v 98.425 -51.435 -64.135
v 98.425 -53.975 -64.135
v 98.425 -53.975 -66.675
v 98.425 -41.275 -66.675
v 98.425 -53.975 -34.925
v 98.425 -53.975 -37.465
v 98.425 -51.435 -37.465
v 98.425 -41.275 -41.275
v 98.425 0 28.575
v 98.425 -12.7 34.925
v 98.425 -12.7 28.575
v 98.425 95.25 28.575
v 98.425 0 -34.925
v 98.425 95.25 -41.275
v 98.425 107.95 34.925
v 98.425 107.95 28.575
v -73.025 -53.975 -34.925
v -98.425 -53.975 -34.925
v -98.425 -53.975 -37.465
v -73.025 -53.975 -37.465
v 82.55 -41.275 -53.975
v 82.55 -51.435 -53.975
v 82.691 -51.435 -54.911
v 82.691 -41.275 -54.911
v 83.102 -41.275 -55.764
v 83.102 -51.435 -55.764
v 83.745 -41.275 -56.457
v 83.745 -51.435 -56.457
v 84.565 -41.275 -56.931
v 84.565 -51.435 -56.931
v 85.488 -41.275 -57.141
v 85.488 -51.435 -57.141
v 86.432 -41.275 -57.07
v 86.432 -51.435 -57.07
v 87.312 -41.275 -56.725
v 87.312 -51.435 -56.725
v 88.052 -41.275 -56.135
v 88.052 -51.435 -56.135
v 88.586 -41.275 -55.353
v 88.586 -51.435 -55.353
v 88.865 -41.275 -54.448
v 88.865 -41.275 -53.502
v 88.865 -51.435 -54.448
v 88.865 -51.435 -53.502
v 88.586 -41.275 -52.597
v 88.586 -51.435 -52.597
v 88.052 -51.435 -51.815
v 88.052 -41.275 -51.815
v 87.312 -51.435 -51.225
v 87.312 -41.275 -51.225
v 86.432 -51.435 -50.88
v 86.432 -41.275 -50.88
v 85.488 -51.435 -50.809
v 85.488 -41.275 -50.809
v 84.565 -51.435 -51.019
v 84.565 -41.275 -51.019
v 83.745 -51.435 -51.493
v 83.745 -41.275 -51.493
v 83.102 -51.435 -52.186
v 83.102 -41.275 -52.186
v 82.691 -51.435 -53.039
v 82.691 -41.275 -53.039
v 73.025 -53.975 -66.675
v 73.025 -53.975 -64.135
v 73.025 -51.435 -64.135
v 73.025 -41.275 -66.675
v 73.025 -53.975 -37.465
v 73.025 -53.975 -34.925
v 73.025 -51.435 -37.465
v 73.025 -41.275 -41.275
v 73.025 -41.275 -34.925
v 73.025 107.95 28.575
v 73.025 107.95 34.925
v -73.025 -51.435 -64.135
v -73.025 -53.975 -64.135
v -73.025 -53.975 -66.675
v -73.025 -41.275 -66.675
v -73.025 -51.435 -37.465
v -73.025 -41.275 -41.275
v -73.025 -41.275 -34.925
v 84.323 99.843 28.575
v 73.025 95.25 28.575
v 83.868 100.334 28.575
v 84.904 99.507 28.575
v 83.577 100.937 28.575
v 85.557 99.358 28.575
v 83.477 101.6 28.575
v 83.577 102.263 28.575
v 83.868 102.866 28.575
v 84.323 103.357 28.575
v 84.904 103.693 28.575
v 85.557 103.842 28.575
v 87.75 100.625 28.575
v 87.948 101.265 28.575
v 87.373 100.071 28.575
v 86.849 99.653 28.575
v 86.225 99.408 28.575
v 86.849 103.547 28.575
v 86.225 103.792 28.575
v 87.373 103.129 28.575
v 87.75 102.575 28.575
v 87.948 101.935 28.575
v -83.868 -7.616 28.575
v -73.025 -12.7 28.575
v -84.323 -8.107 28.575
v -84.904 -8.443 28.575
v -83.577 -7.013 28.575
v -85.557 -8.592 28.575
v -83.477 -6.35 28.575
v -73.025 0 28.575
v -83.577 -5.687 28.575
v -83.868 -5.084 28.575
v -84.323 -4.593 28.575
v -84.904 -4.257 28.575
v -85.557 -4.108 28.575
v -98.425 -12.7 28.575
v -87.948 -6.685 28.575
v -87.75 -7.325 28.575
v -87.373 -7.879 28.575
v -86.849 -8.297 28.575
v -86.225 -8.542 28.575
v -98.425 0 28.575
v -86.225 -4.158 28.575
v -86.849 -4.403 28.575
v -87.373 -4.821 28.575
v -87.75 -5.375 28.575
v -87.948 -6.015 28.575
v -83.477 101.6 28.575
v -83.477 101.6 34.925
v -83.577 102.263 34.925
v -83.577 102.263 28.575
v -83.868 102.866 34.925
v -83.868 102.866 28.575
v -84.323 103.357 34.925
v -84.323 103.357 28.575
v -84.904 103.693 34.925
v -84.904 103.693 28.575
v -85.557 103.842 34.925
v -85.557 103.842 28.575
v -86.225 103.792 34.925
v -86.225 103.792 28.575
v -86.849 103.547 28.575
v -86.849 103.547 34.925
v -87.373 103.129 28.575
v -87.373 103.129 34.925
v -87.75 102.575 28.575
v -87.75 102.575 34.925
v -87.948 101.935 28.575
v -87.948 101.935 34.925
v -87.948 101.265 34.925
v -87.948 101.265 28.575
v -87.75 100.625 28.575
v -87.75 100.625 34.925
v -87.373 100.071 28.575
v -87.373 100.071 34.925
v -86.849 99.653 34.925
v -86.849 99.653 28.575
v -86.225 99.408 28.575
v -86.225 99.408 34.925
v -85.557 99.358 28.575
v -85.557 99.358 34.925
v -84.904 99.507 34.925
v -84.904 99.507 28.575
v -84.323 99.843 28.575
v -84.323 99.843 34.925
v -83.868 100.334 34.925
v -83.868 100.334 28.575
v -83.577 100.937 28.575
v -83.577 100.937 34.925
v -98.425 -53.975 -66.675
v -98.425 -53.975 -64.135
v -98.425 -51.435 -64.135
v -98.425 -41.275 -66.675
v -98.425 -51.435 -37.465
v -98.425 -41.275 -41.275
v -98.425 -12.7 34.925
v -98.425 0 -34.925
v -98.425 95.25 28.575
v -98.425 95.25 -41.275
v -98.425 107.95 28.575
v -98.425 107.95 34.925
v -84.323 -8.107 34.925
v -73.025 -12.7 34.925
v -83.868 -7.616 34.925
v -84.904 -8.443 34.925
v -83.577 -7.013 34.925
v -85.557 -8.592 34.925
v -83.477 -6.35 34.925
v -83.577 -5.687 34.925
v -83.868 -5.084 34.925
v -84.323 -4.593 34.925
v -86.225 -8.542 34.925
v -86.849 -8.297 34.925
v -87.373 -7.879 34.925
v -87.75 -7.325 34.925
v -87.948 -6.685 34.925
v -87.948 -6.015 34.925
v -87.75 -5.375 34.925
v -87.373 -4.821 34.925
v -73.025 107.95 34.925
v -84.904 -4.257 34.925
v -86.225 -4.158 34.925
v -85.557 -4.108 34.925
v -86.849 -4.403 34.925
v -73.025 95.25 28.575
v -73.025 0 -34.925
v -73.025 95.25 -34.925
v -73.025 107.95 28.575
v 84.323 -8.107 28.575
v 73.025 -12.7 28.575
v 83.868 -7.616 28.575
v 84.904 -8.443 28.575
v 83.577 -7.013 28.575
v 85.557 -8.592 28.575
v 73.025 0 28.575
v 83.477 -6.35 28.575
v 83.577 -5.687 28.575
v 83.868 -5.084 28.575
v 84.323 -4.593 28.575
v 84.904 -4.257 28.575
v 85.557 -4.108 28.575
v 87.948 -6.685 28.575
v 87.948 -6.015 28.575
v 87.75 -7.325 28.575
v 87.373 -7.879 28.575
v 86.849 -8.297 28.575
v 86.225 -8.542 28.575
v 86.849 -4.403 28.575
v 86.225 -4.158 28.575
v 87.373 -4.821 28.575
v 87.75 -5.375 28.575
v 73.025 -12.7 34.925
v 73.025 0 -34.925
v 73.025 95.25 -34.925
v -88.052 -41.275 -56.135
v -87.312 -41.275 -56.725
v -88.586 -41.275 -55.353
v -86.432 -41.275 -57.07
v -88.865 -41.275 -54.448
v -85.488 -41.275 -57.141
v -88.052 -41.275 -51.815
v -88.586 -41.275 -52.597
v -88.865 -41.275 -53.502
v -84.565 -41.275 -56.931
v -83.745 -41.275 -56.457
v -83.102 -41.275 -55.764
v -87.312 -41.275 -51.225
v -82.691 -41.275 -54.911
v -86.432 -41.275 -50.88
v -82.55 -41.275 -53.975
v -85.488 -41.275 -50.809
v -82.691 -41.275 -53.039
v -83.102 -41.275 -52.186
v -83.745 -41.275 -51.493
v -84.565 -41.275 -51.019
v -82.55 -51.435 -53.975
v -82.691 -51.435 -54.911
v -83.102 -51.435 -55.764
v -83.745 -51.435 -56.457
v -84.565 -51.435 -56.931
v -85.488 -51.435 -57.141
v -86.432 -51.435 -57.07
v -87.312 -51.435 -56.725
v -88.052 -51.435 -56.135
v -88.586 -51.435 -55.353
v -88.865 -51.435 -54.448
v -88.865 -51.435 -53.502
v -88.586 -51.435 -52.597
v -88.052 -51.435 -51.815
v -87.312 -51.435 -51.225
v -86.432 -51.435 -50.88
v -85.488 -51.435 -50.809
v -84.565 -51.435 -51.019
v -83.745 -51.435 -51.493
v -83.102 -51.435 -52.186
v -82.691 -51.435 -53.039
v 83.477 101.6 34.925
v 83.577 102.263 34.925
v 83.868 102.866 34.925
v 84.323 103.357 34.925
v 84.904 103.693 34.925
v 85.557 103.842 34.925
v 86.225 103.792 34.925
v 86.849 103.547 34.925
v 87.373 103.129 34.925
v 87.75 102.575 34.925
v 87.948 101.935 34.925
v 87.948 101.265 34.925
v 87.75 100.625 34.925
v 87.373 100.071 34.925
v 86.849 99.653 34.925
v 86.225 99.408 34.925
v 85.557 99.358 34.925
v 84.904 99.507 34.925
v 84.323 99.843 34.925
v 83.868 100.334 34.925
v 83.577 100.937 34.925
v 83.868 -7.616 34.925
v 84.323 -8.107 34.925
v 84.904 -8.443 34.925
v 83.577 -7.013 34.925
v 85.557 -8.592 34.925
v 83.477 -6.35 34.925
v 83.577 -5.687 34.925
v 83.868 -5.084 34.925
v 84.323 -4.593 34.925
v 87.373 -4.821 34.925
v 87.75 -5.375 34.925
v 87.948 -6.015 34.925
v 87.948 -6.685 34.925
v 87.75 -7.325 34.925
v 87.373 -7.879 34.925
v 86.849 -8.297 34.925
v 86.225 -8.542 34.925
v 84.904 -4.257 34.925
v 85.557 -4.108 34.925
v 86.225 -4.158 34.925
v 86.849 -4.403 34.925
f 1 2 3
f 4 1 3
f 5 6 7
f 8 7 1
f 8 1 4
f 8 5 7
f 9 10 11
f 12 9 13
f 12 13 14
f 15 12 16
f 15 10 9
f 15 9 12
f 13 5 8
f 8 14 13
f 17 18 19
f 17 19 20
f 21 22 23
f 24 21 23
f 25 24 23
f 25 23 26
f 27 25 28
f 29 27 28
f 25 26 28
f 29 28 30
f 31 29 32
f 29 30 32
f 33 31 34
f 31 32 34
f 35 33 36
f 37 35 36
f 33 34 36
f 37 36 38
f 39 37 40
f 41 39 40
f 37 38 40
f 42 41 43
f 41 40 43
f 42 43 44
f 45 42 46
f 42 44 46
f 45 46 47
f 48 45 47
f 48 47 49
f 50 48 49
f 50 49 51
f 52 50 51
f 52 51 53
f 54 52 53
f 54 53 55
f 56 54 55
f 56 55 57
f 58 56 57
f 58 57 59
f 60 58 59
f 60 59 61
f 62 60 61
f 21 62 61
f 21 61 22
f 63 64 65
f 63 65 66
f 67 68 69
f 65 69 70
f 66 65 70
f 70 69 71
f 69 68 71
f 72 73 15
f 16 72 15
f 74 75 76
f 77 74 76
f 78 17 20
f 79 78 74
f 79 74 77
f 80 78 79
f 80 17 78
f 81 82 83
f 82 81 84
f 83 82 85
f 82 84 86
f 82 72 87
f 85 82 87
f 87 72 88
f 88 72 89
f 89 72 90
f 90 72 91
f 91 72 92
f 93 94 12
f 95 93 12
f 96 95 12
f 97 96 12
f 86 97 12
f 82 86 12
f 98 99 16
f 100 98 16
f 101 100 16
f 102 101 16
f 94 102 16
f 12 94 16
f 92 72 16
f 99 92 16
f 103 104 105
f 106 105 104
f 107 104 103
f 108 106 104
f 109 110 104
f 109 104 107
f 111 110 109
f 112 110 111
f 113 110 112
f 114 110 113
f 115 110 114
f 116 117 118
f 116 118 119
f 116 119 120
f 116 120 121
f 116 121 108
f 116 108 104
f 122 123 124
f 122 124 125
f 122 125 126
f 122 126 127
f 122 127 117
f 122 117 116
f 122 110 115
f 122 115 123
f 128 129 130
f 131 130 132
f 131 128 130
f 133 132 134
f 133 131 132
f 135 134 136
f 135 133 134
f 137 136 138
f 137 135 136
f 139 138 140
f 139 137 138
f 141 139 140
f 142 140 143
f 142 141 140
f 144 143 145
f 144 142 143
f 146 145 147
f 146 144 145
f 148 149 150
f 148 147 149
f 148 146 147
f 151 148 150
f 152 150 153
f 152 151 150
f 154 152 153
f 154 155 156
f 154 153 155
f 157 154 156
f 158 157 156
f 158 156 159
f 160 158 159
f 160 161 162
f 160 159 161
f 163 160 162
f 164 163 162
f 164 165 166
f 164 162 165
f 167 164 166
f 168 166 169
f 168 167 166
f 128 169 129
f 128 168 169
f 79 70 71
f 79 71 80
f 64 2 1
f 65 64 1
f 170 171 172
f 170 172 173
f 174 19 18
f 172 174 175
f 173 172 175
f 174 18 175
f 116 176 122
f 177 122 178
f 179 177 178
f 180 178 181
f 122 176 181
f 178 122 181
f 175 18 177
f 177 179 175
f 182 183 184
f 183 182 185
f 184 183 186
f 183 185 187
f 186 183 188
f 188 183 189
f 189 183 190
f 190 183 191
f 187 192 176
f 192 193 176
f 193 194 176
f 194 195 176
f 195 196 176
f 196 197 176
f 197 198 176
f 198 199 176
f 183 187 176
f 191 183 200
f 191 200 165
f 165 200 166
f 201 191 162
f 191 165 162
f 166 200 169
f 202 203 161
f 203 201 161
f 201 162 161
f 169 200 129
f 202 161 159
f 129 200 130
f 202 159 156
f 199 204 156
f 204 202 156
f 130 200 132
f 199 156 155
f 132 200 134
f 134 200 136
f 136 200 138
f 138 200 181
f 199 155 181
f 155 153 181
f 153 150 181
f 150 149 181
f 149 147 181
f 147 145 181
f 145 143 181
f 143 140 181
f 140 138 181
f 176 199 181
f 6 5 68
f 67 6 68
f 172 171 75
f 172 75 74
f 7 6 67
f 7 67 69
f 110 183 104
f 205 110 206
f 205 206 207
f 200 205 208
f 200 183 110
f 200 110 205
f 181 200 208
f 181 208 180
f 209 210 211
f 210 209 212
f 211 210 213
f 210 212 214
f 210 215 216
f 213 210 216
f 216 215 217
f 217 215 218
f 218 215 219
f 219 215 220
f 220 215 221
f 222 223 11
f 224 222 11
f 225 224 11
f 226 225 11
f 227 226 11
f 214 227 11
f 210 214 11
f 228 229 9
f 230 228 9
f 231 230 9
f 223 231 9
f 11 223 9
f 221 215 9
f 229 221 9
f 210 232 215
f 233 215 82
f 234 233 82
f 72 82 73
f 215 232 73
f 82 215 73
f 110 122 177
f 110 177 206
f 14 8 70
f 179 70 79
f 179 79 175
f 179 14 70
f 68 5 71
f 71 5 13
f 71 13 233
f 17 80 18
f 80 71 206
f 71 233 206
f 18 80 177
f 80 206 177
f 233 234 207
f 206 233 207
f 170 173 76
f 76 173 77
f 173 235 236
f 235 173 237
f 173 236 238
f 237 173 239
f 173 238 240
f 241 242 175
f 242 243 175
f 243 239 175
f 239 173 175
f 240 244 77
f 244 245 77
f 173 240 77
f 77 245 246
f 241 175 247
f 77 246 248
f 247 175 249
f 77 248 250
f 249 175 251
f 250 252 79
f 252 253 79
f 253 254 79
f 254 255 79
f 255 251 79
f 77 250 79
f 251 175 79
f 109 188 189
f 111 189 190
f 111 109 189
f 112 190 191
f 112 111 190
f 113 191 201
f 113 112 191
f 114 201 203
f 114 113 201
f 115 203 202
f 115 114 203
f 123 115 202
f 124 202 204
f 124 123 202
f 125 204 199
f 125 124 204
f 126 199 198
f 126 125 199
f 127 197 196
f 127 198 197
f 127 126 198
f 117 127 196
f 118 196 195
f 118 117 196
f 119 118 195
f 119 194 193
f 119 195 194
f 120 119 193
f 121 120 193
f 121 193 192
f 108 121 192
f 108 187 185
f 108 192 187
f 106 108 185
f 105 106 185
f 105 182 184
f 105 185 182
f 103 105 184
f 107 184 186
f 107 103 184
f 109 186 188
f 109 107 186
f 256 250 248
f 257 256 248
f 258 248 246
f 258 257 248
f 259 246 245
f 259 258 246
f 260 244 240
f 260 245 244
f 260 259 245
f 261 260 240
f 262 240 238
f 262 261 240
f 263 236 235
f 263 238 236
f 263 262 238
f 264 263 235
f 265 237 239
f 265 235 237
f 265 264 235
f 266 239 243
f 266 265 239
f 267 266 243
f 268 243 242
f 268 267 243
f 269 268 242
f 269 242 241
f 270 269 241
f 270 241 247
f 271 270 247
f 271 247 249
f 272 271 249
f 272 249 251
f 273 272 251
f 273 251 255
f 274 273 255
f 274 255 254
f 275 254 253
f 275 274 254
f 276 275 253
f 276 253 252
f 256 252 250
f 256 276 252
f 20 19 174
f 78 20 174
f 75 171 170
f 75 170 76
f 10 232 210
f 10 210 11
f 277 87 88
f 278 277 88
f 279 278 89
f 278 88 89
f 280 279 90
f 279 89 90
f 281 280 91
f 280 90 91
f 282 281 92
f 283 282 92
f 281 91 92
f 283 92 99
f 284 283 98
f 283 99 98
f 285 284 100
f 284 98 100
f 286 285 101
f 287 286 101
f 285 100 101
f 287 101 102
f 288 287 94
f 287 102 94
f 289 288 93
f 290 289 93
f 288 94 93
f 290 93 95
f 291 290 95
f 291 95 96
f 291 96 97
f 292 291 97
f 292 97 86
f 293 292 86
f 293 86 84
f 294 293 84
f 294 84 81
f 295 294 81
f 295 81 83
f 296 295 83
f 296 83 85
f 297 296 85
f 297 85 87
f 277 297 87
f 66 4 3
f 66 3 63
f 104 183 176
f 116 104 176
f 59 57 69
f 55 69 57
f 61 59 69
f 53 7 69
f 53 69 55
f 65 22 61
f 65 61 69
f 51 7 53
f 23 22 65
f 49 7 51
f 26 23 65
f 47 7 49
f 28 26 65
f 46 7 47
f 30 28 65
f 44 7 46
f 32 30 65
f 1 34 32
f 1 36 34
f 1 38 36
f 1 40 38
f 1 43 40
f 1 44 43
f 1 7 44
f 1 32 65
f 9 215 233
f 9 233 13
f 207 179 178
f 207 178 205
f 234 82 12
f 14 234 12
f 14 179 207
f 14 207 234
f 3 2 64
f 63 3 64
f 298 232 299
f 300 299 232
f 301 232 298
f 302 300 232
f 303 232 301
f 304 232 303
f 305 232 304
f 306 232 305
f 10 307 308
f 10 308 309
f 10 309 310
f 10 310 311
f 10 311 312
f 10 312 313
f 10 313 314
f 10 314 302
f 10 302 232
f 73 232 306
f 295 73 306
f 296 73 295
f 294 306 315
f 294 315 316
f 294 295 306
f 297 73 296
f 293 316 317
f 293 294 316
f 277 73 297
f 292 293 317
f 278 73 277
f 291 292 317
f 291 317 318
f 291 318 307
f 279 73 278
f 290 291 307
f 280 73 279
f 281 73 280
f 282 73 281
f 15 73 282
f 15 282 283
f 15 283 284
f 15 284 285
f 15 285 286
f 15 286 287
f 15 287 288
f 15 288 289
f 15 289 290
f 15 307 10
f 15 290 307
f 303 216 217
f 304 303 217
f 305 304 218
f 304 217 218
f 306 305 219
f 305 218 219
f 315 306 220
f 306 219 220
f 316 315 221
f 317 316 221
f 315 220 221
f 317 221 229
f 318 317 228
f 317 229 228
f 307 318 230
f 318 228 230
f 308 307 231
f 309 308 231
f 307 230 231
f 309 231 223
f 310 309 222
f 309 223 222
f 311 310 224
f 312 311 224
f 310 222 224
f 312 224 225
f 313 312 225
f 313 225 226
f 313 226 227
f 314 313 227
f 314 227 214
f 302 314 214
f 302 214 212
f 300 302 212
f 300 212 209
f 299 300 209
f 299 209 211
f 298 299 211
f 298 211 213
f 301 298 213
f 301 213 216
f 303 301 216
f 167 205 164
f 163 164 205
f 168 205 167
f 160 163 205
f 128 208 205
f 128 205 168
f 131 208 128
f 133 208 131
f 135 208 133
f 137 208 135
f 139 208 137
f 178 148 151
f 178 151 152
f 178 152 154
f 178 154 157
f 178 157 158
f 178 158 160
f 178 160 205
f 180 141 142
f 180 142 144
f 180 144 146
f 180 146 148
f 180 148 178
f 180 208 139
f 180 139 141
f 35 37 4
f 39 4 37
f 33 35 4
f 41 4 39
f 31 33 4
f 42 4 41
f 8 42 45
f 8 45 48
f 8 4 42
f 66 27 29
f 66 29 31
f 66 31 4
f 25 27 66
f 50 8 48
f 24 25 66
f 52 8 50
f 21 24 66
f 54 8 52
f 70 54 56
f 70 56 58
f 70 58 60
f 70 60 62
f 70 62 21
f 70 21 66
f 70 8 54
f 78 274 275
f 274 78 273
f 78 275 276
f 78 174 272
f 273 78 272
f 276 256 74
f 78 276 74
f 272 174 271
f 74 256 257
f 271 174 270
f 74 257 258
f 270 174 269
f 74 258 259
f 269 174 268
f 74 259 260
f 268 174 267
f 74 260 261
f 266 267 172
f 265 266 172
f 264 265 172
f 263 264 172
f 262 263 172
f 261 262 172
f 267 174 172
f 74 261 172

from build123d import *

# Parameters (mm, degrees)
SKETCH1_W                   = 196.85
SKETCH1_H                   = 82.55
BOSS_EXTRUDE1_DEPTH         = 95.25
SKETCH3_W                   = 146.05
SKETCH3_H                   = 76.2
CUT_EXTRUDE1_DEPTH          = 144.051280141
SKETCH4_W                   = 25.4
SKETCH4_H                   = 53.975
BOSS_EXTRUDE2_DEPTH         = 6.35
SKETCH5_W                   = 25.4
SKETCH5_H                   = 12.7
BOSS_EXTRUDE3_DEPTH         = 25.4
SKETCH6_W                   = 26.67
SKETCH6_H                   = 2.54
CUT_EXTRUDE2_DEPTH          = 229.622047548
F_1_4_0_25_DIAMETER_HOLE1_D = 6.35
SKETCH16_W                  = 196.85
SKETCH16_H                  = 6.35
CUT_EXTRUDE3_DEPTH          = 191.790819682
BOSS_EXTRUDE4_START         = -6.35
SKETCH11_W                  = 25.4
SKETCH11_H                  = 12.7
BOSS_EXTRUDE4_DEPTH         = 6.35
F_8_CLEARANCE_HOLE1_D       = 4.4958
F_8_CLEARANCE_HOLE1_DEPTH   = 12.7
SKETCH14_W                  = 146.05
SKETCH14_H                  = 41.275
BOSS_EXTRUDE5_DEPTH         = 6.35


with BuildPart() as part:
    # Sketch1 → Boss-Extrude1 (new body)
    with BuildSketch(Plane(origin=(0, 0, 0), x_dir=(1, 0, 0), z_dir=(0, 1, 0))):
        Rectangle(SKETCH1_W, SKETCH1_H)
    extrude(amount=BOSS_EXTRUDE1_DEPTH)

    # Sketch3 → Cut-Extrude1 (cut, through all)
    with BuildSketch(Plane(origin=(0, 95.25, 0), x_dir=(1, 0, 0), z_dir=(0, 1, 0))):
        with Locations((0, -3.175)):
            Rectangle(SKETCH3_W, SKETCH3_H)
    extrude(amount=-CUT_EXTRUDE1_DEPTH, mode=Mode.SUBTRACT)

    # Sketch4 → Boss-Extrude2 (add)
    with BuildSketch(Plane(origin=(0, 0, -41.275), x_dir=(-1, 0, 0), z_dir=(0, 0, -1))):
        with Locations((-85.725, -26.9875)):
            Rectangle(SKETCH4_W, SKETCH4_H)
    boss_extrude2 = extrude(amount=-BOSS_EXTRUDE2_DEPTH)

    # Sketch5 → Boss-Extrude3 (add)
    with BuildSketch(Plane(origin=(0, 0, -41.275), x_dir=(-1, 0, 0), z_dir=(0, 0, -1))):
        with Locations((-85.725, -47.625)):
            Rectangle(SKETCH5_W, SKETCH5_H)
    boss_extrude3 = extrude(amount=BOSS_EXTRUDE3_DEPTH)

    # Sketch6 → Cut-Extrude2 (cut, through all)
    with BuildSketch(Plane(origin=(98.425, 0, 0), x_dir=(0, 0, -1), z_dir=(1, 0, 0))):
        with Locations((50.8, -52.705)):
            Rectangle(SKETCH6_W, SKETCH6_H)
    cut_extrude2 = extrude(amount=-CUT_EXTRUDE2_DEPTH, mode=Mode.SUBTRACT)

    # 1/4 (0.25) Diameter Hole1 (through all)
    with Locations(Plane(origin=(0, -41.275, 0), x_dir=(1, 0, 0), z_dir=(0, 1, 0))):
        with Locations((85.725, 53.975)):
            f_1_4_0_25_diameter_hole1 = Hole(F_1_4_0_25_DIAMETER_HOLE1_D / 2)

    # Sketch16 → Cut-Extrude3 (cut, through all)
    with BuildSketch(Plane(origin=(0, 95.25, 0), x_dir=(1, 0, 0), z_dir=(0, 1, 0))):
        with Locations((0, -38.1)):
            Rectangle(SKETCH16_W, SKETCH16_H)
    extrude(amount=-CUT_EXTRUDE3_DEPTH, mode=Mode.SUBTRACT)

    # Sketch11 → Boss-Extrude4 (add)
    with BuildSketch(Plane.XY.offset(41.275).offset(BOSS_EXTRUDE4_START)):
        with Locations((85.725, 101.6)):
            Rectangle(SKETCH11_W, SKETCH11_H)
        with Locations((85.725, -6.35)):
            Rectangle(SKETCH11_W, SKETCH11_H)
    boss_extrude4 = extrude(amount=-BOSS_EXTRUDE4_DEPTH)

    # #8 Clearance Hole1
    with Locations(Plane.XY.offset(41.275)):
        with Locations((85.725, 101.6), (85.725, -6.35)):
            f_8_clearance_hole1 = Hole(F_8_CLEARANCE_HOLE1_D / 2, depth=F_8_CLEARANCE_HOLE1_DEPTH)

    # Mirror1: Boss-Extrude2, Boss-Extrude3, Cut-Extrude2, 1/4 (0.25) Diameter Hole1, Boss-Extrude4, #8 Clearance Hole1 across plane
    add(boss_extrude2.mirror(Plane(origin=(0, 0, 0), x_dir=(0, 0, 1), z_dir=(1, 0, 0))))
    add(boss_extrude3.mirror(Plane(origin=(0, 0, 0), x_dir=(0, 0, 1), z_dir=(1, 0, 0))))
    add(cut_extrude2.mirror(Plane(origin=(0, 0, 0), x_dir=(0, 0, 1), z_dir=(1, 0, 0))), mode=Mode.SUBTRACT)
    add(f_1_4_0_25_diameter_hole1.mirror(Plane(origin=(0, 0, 0), x_dir=(0, 0, 1), z_dir=(1, 0, 0))), mode=Mode.SUBTRACT)
    add(boss_extrude4.mirror(Plane(origin=(0, 0, 0), x_dir=(0, 0, 1), z_dir=(1, 0, 0))))
    add(f_8_clearance_hole1.mirror(Plane(origin=(0, 0, 0), x_dir=(0, 0, 1), z_dir=(1, 0, 0))), mode=Mode.SUBTRACT)

    # Sketch14 → Boss-Extrude5 (add)
    with BuildSketch(Plane(origin=(0, 0, -41.275), x_dir=(-1, 0, 0), z_dir=(0, 0, -1))):
        with Locations((0, -20.6375)):
            Rectangle(SKETCH14_W, SKETCH14_H)
    extrude(amount=-BOSS_EXTRUDE5_DEPTH)


solid = part.part
